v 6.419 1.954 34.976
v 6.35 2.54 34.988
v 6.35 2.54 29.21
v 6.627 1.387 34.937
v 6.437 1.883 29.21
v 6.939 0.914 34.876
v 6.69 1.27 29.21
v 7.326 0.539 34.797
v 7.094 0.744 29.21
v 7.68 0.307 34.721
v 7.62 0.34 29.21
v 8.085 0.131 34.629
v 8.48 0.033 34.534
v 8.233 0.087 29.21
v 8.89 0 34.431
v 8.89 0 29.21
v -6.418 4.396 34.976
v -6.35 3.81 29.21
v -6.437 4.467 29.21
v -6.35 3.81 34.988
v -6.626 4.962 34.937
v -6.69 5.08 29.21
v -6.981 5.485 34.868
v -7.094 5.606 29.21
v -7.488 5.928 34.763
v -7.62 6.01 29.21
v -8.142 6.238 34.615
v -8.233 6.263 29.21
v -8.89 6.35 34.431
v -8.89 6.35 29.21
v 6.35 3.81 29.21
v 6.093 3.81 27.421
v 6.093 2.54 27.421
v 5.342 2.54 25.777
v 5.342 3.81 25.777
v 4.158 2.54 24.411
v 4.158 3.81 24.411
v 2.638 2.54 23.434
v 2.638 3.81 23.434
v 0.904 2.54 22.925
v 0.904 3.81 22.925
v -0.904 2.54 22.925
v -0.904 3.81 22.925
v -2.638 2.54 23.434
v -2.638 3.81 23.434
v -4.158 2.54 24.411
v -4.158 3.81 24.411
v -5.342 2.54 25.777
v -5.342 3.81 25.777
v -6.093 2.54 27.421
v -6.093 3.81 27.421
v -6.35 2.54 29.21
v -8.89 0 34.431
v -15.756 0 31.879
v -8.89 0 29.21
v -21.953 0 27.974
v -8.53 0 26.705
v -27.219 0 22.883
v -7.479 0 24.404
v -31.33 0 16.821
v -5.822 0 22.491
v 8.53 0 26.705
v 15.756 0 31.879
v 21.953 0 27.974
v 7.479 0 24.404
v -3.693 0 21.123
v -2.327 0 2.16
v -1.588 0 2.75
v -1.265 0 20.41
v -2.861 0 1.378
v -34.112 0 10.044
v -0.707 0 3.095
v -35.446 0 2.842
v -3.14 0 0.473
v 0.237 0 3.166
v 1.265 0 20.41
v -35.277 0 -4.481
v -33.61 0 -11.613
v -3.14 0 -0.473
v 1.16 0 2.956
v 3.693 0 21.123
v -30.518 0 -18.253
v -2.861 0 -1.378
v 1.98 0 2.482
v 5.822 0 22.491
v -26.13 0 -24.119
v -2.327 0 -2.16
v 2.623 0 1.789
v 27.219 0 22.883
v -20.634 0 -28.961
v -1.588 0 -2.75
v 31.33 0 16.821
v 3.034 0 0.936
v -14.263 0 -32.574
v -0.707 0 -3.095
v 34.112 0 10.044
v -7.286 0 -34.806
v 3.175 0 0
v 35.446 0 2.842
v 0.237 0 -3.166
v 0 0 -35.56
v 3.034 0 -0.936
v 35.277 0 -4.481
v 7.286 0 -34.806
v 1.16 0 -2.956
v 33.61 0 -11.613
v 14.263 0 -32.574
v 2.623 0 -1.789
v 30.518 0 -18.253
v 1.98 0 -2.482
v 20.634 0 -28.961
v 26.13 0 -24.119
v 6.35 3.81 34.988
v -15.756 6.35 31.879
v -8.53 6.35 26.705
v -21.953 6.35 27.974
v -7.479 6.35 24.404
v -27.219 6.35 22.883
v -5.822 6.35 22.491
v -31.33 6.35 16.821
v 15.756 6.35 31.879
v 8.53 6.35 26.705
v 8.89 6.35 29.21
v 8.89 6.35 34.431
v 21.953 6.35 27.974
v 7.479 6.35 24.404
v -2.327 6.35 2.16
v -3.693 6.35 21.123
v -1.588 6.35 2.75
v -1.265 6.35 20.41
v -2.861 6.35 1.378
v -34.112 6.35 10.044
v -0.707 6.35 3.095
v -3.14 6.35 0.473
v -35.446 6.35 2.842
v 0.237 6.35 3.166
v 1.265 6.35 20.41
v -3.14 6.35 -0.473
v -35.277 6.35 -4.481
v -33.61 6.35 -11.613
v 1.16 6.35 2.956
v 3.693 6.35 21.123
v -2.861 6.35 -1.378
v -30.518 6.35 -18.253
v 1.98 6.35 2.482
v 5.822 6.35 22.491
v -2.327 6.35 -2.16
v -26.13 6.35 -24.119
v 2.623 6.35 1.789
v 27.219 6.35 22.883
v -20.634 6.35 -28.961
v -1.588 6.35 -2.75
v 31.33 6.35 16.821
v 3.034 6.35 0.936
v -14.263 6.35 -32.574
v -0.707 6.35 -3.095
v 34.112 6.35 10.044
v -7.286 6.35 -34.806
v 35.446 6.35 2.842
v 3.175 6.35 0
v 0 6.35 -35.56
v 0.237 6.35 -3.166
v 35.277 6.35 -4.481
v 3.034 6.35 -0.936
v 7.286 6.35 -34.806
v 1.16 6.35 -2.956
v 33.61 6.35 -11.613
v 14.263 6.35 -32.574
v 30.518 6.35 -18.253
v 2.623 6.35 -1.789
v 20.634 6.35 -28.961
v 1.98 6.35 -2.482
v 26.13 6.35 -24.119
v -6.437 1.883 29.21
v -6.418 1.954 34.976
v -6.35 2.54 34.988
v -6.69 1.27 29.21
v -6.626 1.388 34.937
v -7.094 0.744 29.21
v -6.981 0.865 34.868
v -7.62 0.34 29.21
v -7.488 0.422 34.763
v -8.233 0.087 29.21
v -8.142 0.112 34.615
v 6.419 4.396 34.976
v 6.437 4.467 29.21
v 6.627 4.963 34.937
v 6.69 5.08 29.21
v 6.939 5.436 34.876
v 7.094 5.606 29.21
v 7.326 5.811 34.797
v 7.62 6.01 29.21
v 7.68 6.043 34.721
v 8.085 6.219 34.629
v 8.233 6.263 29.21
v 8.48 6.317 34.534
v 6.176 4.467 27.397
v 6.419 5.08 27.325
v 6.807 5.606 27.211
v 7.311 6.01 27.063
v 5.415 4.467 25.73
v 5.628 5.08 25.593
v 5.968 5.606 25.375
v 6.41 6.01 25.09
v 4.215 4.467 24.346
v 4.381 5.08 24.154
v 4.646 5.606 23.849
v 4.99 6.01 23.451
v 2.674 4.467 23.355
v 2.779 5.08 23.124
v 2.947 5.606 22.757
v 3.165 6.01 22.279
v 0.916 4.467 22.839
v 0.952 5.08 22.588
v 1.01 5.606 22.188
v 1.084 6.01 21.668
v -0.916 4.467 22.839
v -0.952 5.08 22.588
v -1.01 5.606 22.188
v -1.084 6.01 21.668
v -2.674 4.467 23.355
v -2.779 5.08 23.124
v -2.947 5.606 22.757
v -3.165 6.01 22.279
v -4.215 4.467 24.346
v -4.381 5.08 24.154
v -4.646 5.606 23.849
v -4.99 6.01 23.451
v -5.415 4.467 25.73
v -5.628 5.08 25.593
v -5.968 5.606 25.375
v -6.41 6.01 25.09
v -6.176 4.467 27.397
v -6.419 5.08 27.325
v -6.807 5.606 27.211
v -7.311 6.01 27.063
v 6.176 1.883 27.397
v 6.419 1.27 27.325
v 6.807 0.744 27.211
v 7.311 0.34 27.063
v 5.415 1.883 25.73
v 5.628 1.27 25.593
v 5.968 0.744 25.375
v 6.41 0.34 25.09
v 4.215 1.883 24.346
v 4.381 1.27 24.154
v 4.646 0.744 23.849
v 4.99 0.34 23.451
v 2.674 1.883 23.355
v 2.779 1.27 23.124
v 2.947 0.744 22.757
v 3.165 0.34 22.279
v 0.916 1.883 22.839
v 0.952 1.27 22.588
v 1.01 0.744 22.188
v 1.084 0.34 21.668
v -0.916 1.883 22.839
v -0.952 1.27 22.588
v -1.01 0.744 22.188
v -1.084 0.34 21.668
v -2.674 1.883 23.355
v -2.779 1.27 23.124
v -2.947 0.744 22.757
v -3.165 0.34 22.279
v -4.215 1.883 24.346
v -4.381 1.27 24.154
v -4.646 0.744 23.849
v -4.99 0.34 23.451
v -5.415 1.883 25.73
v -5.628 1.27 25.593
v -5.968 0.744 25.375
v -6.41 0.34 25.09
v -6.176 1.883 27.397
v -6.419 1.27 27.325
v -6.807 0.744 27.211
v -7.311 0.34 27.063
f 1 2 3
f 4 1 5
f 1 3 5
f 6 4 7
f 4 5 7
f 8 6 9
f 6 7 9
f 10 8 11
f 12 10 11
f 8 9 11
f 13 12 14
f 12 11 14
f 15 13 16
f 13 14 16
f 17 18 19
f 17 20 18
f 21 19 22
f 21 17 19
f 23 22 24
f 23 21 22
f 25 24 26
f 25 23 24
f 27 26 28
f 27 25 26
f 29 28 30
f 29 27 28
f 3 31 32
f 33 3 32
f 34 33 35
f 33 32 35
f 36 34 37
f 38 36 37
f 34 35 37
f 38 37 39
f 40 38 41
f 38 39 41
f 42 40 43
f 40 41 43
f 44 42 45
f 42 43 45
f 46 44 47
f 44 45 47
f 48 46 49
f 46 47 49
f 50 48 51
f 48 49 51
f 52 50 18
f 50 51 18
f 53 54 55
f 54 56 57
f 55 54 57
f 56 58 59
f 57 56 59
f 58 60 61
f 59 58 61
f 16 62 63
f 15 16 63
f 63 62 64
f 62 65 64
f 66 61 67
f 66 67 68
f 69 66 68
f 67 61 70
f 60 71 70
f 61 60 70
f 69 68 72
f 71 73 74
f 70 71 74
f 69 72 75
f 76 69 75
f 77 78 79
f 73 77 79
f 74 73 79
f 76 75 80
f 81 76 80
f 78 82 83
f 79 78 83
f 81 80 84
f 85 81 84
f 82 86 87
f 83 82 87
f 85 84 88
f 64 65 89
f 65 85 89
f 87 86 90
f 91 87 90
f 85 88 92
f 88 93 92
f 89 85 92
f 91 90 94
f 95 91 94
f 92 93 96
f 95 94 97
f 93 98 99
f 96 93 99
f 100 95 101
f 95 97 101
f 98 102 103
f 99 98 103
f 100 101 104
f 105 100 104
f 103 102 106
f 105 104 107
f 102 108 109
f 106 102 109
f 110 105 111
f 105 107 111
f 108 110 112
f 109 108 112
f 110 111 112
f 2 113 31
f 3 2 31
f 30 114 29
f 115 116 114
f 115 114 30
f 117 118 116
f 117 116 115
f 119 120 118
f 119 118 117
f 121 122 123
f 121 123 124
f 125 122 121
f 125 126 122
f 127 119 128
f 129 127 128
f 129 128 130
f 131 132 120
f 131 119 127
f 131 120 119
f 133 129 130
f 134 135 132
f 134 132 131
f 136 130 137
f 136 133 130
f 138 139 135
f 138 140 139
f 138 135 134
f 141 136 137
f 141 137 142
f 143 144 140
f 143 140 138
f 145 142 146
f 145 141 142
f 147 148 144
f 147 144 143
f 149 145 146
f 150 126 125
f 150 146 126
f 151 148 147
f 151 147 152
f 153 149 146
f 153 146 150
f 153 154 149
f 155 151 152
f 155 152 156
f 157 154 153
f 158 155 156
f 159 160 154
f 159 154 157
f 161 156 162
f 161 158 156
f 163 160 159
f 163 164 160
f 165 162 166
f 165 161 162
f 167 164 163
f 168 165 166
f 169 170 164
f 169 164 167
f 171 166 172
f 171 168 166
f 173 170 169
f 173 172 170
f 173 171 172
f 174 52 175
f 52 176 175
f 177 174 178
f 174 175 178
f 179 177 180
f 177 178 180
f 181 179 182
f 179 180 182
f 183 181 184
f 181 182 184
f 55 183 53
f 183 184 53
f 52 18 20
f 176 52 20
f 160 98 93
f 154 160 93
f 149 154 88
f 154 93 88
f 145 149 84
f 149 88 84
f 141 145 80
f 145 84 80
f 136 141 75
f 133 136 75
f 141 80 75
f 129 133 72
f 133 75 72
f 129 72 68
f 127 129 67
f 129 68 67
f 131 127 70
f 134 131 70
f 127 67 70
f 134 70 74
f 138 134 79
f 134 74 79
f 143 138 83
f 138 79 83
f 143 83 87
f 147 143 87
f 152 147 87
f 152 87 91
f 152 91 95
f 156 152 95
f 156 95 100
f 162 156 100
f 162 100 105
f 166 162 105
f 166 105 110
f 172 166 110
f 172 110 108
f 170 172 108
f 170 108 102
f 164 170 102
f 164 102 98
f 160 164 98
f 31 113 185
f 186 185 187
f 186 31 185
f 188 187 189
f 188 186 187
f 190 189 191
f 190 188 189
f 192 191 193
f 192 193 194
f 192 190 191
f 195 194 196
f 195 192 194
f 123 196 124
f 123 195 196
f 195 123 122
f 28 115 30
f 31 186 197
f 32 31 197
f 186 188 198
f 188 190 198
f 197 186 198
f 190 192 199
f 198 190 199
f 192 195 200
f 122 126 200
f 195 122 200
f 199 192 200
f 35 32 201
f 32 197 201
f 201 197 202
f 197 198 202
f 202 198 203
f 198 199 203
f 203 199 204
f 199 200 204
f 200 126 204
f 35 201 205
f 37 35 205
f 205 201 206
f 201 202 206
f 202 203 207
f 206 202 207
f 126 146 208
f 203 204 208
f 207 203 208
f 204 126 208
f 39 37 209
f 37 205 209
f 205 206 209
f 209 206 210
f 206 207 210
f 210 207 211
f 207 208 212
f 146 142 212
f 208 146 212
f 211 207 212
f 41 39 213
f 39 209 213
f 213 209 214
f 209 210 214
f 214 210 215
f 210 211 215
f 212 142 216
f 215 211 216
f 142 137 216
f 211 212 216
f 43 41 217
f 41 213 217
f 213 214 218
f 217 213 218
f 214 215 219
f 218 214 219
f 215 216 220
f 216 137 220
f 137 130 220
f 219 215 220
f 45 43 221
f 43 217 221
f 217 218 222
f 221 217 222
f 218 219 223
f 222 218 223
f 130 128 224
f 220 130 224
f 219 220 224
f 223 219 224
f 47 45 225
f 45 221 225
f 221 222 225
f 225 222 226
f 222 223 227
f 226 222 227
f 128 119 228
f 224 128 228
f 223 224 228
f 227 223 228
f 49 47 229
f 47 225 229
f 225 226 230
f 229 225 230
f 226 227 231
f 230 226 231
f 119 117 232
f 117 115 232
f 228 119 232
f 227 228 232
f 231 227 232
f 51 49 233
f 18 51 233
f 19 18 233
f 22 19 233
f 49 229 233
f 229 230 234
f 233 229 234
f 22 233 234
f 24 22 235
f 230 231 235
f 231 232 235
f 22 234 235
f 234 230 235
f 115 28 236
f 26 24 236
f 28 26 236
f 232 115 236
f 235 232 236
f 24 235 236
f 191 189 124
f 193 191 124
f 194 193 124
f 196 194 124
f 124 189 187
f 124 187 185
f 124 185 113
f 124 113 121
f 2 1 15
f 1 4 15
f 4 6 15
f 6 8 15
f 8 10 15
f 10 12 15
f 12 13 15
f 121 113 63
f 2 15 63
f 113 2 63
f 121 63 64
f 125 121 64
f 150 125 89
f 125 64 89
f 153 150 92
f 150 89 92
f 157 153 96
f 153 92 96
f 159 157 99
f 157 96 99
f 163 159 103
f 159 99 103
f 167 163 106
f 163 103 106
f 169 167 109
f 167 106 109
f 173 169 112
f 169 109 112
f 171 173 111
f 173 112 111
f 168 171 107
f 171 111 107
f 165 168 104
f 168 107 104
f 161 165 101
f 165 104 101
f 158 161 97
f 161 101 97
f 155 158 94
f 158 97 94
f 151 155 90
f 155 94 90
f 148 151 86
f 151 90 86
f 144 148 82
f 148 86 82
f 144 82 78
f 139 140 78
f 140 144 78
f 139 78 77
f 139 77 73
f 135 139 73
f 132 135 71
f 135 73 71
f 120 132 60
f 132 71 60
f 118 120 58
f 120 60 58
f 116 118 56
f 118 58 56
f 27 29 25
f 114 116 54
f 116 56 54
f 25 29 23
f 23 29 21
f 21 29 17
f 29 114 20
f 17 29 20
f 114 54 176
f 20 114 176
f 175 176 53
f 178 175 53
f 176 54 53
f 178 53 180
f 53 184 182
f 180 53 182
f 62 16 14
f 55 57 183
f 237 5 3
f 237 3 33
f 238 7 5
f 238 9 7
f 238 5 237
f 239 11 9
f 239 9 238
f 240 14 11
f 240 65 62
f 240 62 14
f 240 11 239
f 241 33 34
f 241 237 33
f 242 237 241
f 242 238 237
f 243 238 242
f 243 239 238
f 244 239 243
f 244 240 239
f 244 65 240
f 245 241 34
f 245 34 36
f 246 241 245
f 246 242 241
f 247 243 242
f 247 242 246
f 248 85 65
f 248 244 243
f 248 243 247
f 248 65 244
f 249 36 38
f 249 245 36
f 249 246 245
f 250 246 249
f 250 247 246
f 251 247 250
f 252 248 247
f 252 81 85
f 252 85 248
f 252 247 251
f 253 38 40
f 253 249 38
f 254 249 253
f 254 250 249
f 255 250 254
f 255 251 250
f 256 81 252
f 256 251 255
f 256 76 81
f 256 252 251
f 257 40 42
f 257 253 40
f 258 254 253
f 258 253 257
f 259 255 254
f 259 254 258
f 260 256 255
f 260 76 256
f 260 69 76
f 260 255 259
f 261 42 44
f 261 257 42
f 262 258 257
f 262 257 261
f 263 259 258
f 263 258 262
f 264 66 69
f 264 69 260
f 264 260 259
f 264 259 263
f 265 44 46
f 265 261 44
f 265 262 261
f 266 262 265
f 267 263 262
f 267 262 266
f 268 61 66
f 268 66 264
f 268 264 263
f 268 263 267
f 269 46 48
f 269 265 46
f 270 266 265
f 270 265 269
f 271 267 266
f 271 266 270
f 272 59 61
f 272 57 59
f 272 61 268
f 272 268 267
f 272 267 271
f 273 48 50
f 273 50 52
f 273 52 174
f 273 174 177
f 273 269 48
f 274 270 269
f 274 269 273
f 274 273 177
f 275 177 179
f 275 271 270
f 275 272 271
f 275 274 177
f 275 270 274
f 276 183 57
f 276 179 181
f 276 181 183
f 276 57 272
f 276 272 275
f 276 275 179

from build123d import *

# Parameters (mm, degrees)
SKETCH2_R                  = 35.56
BOSS_EXTRUDE1_DEPTH        = 6.35
SHOCK_CORD_HOLE_DEPTH      = 1
SHOCK_CORD_HOLE_DEPTH_BACK = 7.35
FILLET1_R                  = 2.54
SKETCH18_R                 = 3.175
CUT_EXTRUDE1_DEPTH         = 7.3500001


with BuildPart() as part:
    # Sketch2 → Boss-Extrude1 (new body)
    with BuildSketch(Plane(origin=(0, 0, 0), x_dir=(1, 0, 0), z_dir=(0, 1, 0))):
        Circle(SKETCH2_R)
    extrude(amount=BOSS_EXTRUDE1_DEPTH)

    # Sketch4 → Shock Cord hole (cut, two sides)
    with BuildSketch(Plane(origin=(0, 6.35, 0), x_dir=(1, 0, 0), z_dir=(0, 1, 0))) as shock_cord_hole_sk:
        with BuildLine():
            Line((6.35, -209.104630755), (6.35, -34.988442377))
            Line((6.35, -34.988442377), (6.35, -29.21))
            ThreePointArc((6.35, -29.21), (0, -22.86), (-6.35, -29.21))
            Line((-6.35, -29.21), (-6.35, -34.988442377))
            Line((-6.35, -34.988442377), (-6.35, -209.104630755))
            Line((-6.35, -209.104630755), (-6.35, -557.33700751))
            Line((-6.35, -557.33700751), (6.35, -557.33700751))
            Line((6.35, -557.33700751), (6.35, -209.104630755))
        make_face()
    extrude(amount=SHOCK_CORD_HOLE_DEPTH, mode=Mode.SUBTRACT)
    extrude(shock_cord_hole_sk.sketch, amount=-SHOCK_CORD_HOLE_DEPTH_BACK, mode=Mode.SUBTRACT)

    # Fillet1
    fillet1_edges = [part.edges().sort_by_distance(p)[0] for p in [
        (-6.35, 6.35, 32.099221189),
        (0, 6.35, 22.86),
        (6.35, 6.35, 32.099221189),
        (6.35, 0, 32.099221189),
        (0, 0, 22.86),
        (-6.35, 0, 32.099221189),
    ]]
    fillet(fillet1_edges, radius=FILLET1_R)

    # Sketch18 → Cut-Extrude1 (cut, through all)
    with BuildSketch(Plane.XZ):
        Circle(SKETCH18_R)
    extrude(amount=-CUT_EXTRUDE1_DEPTH, mode=Mode.SUBTRACT)


solid = part.part
